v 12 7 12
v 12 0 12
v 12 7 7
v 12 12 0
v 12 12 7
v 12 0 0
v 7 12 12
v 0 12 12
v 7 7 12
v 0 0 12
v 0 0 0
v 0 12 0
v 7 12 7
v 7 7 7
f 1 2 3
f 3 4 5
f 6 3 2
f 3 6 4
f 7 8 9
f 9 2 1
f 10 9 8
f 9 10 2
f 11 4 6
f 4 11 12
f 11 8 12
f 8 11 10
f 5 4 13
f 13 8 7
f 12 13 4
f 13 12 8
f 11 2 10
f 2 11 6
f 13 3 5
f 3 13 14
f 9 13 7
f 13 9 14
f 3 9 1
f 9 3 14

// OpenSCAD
difference() {
        cube(12, 0);
        translate([7,7,7]) 
        cube(12, 0);
}
